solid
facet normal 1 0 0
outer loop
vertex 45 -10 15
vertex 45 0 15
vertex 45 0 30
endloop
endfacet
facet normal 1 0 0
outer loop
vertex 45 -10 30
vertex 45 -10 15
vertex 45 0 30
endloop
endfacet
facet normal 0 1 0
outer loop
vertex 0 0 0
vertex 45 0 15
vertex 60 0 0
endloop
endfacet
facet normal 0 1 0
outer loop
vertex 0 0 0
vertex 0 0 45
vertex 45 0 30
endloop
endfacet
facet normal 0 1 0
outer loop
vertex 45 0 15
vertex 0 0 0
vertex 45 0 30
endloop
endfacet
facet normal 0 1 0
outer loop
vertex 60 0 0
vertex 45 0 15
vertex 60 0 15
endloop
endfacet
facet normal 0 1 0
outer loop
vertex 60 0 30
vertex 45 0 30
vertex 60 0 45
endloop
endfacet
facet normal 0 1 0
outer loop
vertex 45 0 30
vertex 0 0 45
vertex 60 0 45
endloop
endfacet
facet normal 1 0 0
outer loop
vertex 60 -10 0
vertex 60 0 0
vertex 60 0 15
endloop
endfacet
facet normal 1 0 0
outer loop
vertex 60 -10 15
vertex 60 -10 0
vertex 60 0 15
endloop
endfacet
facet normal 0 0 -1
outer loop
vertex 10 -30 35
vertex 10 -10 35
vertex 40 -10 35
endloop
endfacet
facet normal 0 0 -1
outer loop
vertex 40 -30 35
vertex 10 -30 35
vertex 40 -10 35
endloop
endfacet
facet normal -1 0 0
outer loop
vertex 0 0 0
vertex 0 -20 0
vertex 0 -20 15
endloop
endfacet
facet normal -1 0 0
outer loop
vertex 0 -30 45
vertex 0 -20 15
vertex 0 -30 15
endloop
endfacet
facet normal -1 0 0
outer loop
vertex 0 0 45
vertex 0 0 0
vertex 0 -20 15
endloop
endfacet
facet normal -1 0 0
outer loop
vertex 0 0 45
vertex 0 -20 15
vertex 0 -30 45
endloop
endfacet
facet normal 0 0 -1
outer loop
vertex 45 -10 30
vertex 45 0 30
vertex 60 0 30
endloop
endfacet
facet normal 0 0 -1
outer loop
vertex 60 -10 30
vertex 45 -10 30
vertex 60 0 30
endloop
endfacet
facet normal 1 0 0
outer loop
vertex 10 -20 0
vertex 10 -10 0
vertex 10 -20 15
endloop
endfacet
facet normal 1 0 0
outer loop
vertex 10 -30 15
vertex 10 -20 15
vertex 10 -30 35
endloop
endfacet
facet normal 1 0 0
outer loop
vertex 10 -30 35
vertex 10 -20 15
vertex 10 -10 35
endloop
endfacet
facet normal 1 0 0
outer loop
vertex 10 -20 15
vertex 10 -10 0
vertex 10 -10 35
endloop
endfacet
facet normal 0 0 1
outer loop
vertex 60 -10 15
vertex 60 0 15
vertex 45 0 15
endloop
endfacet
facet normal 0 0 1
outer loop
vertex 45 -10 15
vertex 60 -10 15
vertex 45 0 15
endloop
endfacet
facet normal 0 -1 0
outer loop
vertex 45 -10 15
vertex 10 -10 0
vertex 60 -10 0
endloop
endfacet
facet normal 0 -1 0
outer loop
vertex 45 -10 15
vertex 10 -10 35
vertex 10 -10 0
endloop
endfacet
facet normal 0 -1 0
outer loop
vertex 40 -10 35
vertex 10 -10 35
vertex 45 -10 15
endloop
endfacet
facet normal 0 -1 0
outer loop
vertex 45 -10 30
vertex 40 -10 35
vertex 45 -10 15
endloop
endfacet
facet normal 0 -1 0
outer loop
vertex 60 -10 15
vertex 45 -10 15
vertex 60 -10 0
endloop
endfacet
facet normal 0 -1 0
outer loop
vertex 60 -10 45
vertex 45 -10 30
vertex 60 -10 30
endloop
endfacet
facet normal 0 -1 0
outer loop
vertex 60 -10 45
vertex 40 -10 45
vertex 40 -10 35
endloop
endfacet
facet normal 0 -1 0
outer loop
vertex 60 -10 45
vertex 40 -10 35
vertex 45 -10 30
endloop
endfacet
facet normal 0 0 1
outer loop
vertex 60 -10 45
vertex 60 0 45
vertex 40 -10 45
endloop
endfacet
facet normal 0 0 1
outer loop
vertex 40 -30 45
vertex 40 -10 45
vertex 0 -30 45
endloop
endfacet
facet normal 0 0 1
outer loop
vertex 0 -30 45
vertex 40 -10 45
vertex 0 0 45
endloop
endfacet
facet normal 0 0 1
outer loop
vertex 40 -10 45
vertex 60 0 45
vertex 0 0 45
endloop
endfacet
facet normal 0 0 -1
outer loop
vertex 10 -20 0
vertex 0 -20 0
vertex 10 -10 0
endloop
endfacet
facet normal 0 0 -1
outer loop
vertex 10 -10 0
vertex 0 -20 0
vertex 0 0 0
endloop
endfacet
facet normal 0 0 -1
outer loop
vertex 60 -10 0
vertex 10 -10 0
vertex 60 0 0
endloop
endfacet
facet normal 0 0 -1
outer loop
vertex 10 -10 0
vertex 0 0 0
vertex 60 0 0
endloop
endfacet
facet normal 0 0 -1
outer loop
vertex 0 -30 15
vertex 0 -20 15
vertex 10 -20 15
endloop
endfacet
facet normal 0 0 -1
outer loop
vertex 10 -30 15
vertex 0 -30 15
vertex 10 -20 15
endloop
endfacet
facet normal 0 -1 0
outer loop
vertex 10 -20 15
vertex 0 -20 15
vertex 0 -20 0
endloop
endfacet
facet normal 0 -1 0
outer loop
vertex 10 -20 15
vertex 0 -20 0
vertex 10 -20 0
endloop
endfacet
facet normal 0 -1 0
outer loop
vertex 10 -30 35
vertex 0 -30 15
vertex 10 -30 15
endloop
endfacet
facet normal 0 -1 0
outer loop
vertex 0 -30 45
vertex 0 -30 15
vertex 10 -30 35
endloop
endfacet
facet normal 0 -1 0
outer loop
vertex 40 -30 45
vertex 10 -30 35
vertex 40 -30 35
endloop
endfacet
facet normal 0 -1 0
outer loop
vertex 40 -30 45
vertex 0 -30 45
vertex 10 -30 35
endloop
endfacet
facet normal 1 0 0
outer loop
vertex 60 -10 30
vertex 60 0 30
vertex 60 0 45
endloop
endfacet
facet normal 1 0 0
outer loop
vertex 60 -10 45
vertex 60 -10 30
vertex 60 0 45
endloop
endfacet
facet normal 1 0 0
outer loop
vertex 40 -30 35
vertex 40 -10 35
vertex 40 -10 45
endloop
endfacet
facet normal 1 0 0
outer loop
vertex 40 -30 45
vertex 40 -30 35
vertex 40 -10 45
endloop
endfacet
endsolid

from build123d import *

# Parameters (mm, degrees)
F1_DEPTH = 30
F2_DEPTH = 10
F0_W     = 10
F0_H     = 15
F3_DEPTH = 20


with BuildPart() as f1:
    # F0 (on Front) → F1 (new body)
    with BuildSketch(Plane.XZ):
        Polygon((0, 45), (0, 15), (10, 15), (10, 35), (40, 35), (40, 45), align=None)
    extrude(amount=F1_DEPTH)

    # F0 (on Front) → F2 (join)
    with BuildSketch(Plane.XZ):
        Polygon((10, 15), (10, 0), (60, 0), (60, 15), (45, 15), (45, 30), (60, 30), (60, 45), (40, 45), (40, 35), (10, 35), align=None)
    extrude(amount=F2_DEPTH)

    # F0 (on Front) → F3 (join)
    with BuildSketch(Plane.XZ):
        with Locations((5, 7.5)):
            Rectangle(F0_W, F0_H)
    extrude(amount=F3_DEPTH)


solid = f1.part
